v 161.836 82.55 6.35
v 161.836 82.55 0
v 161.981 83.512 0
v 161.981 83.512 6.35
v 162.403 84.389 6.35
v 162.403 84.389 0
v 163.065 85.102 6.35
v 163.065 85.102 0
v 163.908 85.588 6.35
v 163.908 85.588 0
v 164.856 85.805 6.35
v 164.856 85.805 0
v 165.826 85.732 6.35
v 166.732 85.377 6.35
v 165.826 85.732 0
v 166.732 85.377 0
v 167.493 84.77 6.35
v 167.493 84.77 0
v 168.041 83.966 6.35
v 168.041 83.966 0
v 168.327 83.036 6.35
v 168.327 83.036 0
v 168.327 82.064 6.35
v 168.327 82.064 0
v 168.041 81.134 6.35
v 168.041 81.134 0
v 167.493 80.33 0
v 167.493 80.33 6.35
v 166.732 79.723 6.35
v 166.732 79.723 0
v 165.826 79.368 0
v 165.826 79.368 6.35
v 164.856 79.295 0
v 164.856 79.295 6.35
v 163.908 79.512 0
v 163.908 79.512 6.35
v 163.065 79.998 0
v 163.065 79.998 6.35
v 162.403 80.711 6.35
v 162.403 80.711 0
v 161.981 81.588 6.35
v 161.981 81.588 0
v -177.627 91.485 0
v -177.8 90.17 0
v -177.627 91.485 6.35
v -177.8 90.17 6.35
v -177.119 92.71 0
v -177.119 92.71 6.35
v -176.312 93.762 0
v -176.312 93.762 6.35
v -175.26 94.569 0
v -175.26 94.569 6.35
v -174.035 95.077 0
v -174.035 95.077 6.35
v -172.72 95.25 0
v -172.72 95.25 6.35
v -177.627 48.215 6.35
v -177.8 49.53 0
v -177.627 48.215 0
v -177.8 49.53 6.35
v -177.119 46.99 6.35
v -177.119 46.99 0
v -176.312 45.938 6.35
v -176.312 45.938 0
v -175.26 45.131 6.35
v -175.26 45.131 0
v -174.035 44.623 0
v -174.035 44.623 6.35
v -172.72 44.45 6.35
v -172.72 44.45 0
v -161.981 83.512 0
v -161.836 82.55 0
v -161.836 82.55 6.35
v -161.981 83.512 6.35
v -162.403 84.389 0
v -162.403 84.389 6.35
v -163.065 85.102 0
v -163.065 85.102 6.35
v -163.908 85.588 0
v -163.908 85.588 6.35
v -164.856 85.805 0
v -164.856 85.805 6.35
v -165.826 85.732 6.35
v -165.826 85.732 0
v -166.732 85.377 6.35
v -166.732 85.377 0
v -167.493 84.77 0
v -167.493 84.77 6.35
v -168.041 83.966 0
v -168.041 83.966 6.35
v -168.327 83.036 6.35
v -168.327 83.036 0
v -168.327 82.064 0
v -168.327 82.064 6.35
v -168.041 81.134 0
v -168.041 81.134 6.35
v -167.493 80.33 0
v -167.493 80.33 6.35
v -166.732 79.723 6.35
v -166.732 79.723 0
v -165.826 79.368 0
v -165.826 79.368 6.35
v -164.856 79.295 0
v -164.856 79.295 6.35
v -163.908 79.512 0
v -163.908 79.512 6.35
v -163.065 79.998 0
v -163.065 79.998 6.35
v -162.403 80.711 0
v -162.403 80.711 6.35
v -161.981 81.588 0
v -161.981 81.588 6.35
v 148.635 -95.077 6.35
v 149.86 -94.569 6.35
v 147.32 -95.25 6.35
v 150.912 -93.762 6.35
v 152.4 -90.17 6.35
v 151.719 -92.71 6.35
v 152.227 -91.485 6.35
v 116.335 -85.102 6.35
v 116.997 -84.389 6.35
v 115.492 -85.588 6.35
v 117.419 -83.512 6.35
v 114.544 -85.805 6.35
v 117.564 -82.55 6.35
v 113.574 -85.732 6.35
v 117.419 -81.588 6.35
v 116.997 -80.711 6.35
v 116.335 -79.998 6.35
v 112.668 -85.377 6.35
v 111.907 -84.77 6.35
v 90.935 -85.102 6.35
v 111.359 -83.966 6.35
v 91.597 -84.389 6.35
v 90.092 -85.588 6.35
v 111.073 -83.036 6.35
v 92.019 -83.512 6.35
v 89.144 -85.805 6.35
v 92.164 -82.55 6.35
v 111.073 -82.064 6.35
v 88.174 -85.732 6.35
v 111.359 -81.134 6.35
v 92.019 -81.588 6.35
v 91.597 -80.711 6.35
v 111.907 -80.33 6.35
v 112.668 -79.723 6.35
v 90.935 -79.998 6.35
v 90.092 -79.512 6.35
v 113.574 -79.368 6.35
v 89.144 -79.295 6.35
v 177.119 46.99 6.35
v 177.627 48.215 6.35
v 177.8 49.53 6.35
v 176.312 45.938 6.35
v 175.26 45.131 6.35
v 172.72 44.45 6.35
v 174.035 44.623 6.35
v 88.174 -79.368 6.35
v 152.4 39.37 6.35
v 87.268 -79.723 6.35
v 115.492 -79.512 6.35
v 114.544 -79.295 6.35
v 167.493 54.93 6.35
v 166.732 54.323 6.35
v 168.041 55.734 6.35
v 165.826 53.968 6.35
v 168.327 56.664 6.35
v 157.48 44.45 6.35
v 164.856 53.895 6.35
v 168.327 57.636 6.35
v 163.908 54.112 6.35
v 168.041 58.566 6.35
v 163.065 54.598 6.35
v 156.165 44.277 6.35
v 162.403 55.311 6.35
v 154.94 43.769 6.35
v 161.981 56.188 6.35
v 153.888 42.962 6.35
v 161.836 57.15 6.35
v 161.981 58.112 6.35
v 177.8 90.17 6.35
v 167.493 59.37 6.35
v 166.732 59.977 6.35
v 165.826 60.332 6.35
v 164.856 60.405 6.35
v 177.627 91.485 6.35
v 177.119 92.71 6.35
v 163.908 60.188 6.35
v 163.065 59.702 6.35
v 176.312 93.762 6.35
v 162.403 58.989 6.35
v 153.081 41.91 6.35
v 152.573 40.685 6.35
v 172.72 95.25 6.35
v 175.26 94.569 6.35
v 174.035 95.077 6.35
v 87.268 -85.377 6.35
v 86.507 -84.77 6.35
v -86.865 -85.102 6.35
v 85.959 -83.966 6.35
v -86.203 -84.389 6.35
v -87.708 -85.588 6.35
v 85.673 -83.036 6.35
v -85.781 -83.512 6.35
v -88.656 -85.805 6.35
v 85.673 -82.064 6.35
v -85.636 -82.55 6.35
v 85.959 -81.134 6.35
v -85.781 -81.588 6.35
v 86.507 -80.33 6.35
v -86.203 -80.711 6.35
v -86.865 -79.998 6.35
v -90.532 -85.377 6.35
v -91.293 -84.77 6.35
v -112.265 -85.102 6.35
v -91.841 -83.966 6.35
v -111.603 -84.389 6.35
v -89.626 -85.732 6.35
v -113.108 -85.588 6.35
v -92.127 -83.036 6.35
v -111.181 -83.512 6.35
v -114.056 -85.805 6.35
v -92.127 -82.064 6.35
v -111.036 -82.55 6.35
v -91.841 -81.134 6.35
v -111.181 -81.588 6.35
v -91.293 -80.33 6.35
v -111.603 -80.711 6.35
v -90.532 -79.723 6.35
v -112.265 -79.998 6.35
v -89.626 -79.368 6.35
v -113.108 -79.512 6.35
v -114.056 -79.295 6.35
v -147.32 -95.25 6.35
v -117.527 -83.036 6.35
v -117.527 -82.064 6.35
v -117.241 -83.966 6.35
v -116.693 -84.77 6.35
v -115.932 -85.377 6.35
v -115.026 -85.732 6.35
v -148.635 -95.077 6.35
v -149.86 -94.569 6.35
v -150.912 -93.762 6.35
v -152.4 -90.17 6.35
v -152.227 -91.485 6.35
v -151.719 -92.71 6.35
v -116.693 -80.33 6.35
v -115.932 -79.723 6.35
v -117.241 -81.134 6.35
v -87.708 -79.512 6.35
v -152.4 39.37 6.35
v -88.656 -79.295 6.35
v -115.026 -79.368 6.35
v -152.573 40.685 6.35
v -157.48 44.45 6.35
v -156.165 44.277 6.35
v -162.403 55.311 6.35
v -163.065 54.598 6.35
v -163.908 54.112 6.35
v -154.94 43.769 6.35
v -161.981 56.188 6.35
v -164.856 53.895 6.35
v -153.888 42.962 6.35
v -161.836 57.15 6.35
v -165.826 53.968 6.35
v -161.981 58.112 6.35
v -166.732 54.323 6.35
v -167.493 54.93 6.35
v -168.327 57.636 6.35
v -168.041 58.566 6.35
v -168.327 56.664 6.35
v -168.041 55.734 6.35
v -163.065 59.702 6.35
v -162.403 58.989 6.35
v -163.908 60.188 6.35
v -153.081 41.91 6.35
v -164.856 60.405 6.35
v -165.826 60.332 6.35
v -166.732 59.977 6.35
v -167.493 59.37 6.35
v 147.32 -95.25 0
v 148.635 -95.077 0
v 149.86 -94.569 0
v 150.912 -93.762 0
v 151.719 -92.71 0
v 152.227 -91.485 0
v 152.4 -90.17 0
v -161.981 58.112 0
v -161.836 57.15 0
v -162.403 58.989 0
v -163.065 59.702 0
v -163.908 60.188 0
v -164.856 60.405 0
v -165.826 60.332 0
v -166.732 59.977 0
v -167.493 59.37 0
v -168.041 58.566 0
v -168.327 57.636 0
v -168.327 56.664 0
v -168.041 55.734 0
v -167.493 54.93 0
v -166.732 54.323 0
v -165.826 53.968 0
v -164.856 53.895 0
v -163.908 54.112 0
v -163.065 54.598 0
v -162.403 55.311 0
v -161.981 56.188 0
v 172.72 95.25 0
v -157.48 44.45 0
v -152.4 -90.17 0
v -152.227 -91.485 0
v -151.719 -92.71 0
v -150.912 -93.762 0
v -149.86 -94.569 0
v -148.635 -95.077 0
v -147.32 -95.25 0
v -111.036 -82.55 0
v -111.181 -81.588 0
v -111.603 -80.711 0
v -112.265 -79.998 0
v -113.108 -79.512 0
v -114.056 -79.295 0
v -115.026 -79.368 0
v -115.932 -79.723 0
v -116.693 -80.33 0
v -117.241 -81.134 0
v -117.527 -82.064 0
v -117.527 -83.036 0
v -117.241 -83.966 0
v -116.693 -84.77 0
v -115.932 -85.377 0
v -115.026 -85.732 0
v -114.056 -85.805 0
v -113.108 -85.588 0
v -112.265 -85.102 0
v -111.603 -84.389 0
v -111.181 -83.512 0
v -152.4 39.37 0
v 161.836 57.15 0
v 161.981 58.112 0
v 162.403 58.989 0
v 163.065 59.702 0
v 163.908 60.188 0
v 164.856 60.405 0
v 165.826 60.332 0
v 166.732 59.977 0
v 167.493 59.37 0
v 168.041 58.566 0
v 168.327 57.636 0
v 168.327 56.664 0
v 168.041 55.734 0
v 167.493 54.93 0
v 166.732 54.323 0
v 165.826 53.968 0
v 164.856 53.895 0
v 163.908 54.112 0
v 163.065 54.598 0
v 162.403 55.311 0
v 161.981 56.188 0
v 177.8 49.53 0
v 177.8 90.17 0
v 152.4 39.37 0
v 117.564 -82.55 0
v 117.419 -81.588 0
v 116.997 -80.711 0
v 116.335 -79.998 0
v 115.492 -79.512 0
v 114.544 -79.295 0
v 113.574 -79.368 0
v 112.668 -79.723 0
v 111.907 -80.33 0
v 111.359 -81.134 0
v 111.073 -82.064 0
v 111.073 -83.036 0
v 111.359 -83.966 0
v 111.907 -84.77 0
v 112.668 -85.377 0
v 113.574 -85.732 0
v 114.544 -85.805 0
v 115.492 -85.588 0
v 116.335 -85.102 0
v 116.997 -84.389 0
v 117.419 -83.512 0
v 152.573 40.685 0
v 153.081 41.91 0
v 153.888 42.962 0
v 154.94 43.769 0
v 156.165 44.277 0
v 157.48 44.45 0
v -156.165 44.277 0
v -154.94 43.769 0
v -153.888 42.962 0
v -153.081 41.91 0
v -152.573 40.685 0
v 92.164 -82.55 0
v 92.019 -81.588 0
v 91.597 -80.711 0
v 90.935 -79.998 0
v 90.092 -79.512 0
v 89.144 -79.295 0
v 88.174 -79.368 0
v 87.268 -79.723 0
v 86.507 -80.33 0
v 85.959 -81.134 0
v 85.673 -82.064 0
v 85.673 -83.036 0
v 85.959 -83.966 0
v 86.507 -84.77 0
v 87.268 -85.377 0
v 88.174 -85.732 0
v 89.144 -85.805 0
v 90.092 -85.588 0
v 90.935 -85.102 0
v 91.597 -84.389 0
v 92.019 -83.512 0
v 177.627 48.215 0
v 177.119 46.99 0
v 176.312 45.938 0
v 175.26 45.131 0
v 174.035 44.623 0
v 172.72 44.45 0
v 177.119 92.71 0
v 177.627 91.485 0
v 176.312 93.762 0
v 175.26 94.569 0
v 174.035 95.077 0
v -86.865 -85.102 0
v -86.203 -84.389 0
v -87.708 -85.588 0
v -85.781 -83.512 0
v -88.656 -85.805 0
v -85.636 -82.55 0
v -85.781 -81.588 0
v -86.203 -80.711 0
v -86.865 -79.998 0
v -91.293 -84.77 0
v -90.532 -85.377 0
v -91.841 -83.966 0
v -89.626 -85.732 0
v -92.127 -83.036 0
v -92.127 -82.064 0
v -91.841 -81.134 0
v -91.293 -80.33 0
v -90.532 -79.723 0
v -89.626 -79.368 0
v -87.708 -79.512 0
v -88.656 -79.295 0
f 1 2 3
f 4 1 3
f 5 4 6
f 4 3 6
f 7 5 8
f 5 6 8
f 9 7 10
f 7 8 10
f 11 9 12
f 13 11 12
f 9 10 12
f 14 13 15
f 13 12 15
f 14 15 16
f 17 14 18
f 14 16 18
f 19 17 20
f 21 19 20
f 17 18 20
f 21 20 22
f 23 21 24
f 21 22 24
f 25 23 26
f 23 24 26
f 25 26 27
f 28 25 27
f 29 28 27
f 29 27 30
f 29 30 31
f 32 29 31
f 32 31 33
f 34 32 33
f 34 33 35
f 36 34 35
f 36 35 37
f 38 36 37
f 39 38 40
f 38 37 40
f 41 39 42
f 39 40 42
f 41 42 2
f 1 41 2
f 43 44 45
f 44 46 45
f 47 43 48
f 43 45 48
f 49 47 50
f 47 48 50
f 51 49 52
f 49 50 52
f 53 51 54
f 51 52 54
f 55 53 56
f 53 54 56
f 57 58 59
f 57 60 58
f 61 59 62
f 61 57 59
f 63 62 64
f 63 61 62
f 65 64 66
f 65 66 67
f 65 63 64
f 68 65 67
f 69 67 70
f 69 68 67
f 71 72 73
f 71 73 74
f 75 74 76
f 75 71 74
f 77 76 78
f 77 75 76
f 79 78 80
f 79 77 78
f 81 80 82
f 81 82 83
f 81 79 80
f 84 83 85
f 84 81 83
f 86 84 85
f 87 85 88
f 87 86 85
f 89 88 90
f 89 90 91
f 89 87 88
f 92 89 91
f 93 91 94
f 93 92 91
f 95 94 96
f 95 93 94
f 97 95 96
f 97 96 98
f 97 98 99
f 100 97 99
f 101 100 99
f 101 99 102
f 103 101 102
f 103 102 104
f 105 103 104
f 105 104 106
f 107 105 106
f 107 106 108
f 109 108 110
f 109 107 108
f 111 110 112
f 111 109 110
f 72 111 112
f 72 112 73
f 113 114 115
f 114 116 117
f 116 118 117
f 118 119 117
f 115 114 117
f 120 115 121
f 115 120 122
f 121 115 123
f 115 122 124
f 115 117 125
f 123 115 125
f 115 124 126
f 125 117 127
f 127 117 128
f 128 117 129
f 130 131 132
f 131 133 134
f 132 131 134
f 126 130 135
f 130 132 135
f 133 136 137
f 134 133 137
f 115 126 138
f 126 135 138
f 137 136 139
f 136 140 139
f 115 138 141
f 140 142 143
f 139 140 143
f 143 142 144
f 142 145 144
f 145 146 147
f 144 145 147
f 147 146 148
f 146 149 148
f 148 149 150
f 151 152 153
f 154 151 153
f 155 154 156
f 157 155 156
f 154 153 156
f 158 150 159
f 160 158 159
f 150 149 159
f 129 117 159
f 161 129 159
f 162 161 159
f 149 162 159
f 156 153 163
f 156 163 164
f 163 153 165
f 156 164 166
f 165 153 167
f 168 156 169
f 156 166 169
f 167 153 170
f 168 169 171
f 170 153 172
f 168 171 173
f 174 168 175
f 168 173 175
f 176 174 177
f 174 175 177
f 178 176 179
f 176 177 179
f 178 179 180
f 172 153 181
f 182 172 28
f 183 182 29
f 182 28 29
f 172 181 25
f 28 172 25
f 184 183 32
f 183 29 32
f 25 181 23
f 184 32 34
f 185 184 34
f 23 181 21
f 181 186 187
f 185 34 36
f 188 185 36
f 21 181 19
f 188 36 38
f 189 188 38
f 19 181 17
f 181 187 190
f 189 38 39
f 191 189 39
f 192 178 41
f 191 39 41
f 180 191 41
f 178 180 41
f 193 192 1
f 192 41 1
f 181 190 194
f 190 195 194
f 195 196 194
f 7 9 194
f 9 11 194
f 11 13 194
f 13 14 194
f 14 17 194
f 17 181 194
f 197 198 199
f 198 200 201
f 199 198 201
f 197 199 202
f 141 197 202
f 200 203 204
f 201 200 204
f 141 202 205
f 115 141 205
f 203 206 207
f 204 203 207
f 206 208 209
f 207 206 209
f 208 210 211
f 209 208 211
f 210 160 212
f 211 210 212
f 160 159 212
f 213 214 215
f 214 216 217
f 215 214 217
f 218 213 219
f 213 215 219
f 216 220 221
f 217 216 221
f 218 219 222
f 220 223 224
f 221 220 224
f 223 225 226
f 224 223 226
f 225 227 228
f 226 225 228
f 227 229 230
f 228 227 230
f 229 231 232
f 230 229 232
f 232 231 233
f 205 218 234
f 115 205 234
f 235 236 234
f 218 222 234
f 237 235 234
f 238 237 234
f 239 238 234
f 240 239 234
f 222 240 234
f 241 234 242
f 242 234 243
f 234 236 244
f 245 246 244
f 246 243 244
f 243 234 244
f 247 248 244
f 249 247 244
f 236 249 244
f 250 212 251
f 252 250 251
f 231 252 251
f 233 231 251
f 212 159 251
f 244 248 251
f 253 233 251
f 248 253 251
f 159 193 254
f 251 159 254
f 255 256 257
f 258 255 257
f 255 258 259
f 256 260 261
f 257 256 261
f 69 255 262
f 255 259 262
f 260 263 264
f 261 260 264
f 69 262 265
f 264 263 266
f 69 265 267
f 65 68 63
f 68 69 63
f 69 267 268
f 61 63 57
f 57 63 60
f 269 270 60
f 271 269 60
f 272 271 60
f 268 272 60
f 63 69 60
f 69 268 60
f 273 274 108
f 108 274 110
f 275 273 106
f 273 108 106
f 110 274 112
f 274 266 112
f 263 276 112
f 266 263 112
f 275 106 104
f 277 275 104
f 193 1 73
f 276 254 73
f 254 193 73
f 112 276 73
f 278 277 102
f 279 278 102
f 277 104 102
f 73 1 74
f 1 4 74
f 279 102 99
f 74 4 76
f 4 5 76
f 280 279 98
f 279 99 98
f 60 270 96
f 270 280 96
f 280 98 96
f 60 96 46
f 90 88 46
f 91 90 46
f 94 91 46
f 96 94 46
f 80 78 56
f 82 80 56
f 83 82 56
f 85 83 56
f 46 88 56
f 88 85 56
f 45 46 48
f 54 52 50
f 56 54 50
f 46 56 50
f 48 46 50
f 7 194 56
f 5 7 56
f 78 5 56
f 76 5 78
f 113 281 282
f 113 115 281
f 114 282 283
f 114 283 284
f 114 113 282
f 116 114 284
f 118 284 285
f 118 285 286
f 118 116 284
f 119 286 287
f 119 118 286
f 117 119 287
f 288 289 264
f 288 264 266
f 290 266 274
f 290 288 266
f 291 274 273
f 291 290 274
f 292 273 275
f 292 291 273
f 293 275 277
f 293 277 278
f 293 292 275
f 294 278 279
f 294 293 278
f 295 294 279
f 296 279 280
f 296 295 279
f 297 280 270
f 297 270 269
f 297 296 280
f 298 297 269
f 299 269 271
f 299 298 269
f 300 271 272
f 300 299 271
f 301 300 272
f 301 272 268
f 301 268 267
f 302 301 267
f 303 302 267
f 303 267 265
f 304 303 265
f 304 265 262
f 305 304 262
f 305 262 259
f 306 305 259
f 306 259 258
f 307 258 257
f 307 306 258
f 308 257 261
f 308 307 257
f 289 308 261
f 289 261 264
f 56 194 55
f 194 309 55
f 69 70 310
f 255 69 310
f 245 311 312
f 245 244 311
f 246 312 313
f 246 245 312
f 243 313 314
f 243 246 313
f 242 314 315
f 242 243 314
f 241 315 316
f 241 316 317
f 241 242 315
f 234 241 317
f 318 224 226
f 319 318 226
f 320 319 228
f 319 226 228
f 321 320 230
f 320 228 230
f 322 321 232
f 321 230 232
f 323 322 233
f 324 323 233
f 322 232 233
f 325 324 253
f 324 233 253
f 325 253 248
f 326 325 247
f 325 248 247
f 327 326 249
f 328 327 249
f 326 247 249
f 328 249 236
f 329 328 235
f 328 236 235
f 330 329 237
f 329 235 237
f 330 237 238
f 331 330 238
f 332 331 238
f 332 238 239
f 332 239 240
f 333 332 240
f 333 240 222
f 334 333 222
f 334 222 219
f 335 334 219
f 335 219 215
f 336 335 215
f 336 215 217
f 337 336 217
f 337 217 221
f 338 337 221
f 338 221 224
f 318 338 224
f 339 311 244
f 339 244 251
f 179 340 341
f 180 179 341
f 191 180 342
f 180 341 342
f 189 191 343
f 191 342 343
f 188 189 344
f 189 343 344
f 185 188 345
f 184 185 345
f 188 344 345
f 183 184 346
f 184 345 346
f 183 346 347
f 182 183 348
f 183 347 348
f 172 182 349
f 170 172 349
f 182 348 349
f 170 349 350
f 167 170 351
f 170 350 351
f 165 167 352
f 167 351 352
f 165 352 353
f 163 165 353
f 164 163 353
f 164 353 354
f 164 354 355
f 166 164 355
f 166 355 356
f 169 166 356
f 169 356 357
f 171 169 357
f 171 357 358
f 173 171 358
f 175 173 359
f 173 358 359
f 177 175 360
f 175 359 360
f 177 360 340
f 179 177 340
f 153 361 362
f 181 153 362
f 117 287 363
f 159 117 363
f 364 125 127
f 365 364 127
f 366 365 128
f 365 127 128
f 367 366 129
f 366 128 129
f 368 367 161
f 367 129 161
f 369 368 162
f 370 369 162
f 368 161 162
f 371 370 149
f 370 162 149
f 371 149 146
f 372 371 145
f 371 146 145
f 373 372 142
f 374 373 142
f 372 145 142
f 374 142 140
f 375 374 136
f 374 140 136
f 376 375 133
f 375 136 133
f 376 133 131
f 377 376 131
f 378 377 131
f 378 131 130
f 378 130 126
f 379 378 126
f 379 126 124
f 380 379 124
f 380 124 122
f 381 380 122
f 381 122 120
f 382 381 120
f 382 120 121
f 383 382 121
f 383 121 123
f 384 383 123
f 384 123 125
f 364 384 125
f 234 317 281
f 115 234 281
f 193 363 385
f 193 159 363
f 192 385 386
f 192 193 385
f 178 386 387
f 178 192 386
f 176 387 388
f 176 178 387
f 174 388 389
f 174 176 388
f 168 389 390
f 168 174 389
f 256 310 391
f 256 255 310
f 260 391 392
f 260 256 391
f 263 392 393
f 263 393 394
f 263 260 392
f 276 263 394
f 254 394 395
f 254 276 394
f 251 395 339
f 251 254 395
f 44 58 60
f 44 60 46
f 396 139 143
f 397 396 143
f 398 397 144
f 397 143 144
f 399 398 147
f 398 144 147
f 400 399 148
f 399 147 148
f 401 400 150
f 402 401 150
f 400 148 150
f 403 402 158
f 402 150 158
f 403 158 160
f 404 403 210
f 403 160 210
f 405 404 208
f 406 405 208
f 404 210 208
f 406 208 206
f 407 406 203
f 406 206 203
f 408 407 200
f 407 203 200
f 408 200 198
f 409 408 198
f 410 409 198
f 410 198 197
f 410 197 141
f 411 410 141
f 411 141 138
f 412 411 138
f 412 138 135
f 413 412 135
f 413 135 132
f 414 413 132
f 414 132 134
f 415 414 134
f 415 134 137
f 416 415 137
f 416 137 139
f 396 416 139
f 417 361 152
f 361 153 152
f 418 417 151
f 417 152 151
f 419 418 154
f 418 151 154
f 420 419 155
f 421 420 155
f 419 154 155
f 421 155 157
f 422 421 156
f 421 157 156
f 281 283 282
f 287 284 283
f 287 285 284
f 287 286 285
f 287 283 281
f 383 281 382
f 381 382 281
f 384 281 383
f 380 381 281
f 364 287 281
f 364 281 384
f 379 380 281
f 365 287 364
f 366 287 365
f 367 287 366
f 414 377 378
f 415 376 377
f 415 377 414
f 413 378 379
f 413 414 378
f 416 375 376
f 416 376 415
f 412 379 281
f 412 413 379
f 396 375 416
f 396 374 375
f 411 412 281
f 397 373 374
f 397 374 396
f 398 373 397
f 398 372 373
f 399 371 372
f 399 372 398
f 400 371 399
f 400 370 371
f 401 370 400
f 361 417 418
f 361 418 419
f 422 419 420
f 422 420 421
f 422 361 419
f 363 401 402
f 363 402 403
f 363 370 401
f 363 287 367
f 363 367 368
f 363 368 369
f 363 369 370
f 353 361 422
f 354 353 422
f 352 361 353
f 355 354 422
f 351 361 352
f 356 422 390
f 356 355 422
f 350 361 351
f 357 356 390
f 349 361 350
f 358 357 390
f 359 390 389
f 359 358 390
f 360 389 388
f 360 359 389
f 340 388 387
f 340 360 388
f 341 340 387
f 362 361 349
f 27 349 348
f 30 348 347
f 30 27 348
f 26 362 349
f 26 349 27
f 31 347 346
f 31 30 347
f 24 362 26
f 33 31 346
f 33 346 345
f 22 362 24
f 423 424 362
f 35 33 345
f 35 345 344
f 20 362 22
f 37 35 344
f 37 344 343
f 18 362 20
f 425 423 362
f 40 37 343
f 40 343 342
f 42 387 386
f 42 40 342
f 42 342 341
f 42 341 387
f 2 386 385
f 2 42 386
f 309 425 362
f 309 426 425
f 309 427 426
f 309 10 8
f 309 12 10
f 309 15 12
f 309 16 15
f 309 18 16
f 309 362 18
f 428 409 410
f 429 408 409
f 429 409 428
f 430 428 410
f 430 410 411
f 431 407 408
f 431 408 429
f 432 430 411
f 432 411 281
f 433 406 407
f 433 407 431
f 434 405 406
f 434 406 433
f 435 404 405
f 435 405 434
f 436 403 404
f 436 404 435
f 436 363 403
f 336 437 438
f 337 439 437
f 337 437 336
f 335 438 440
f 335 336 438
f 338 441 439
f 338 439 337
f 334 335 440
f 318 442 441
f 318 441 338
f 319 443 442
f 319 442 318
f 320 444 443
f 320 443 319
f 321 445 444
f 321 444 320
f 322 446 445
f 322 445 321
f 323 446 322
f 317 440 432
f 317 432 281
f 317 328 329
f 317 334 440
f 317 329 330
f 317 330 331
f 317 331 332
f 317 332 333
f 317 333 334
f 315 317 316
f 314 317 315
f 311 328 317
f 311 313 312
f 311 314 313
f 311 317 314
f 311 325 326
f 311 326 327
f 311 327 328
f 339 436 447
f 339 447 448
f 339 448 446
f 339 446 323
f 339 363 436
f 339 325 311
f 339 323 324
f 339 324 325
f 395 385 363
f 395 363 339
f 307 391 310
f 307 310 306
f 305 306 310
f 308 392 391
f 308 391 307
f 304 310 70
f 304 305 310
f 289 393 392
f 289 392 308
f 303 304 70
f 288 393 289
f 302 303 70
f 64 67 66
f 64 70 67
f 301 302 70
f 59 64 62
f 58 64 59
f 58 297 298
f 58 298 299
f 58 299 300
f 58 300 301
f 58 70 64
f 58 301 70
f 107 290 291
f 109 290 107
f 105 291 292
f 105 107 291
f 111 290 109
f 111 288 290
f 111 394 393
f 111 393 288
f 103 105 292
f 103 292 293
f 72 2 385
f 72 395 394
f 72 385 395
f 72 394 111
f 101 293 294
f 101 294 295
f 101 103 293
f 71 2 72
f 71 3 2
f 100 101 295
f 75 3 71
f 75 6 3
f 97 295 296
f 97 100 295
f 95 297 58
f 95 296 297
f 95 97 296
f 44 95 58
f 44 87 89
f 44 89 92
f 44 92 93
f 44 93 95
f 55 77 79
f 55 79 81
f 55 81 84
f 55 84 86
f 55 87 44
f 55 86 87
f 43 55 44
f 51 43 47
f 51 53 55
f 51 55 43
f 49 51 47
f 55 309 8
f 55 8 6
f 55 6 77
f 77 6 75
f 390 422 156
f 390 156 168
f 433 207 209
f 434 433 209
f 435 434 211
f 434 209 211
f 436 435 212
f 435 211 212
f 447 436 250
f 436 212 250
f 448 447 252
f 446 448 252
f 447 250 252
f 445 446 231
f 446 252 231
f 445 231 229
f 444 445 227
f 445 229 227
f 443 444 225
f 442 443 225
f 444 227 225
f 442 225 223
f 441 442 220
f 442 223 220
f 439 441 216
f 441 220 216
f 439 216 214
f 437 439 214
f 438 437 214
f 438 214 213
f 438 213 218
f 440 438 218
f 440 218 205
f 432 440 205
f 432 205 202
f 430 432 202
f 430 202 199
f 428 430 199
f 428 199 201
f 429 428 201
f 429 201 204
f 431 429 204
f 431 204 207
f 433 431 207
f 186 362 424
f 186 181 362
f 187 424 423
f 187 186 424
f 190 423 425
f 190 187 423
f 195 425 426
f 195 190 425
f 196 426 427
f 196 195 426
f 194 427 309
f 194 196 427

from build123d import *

# Parameters (mm, degrees)
SKETCH1_W           = 304.8
SKETCH1_H           = 190.5
BOSS_EXTRUDE1_DEPTH = 6.35
SKETCH2_R           = 3.2639
CUT_EXTRUDE1_DEPTH  = 180.829488683
SKETCH3_W           = 25.4
SKETCH3_H           = 50.8
SKETCH3_R           = 3.2639
BOSS_EXTRUDE2_DEPTH = 6.35
FILLET1_R           = 5.08


with BuildPart() as part:
    # Sketch1 → Boss-Extrude1 (new body)
    with BuildSketch(Plane.XY):
        Rectangle(SKETCH1_W, SKETCH1_H)
    extrude(amount=BOSS_EXTRUDE1_DEPTH)

    # Sketch2 → Cut-Extrude1 (cut, through all)
    with BuildSketch(Plane.XY.offset(6.35)):
        with Locations((-114.3, -82.55)):
            Circle(SKETCH2_R)
        with Locations((-88.9, -82.55)):
            Circle(SKETCH2_R)
        with Locations((88.9, -82.55)):
            Circle(SKETCH2_R)
        with Locations((114.3, -82.55)):
            Circle(SKETCH2_R)
    extrude(amount=-CUT_EXTRUDE1_DEPTH, mode=Mode.SUBTRACT)

    # Sketch3 → Boss-Extrude2 (add)
    with BuildSketch(Plane.XY):
        with Locations((-165.1, 69.85)):
            Rectangle(SKETCH3_W, SKETCH3_H)
        with Locations((-165.1, 82.55)):
            Circle(SKETCH3_R, mode=Mode.SUBTRACT)
        with Locations((-165.1, 57.15)):
            Circle(SKETCH3_R, mode=Mode.SUBTRACT)
    boss_extrude2 = extrude(amount=BOSS_EXTRUDE2_DEPTH)

    # Mirror1: Boss-Extrude2 across plane
    add(boss_extrude2.mirror(Plane(origin=(0, 0, 0), x_dir=(0, 0, 1), z_dir=(1, 0, 0))))

    # Fillet1
    fillet1_edges = [part.edges().sort_by_distance(p)[0] for p in [
        (-177.8, 44.45, 3.175),
        (-177.8, 95.25, 3.175),
        (-152.4, 44.45, 3.175),
        (152.4, 44.45, 3.175),
        (177.8, 44.45, 3.175),
        (177.8, 95.25, 3.175),
        (152.4, -95.25, 3.175),
        (-152.4, -95.25, 3.175),
    ]]
    fillet(fillet1_edges, radius=FILLET1_R)


solid = part.part
